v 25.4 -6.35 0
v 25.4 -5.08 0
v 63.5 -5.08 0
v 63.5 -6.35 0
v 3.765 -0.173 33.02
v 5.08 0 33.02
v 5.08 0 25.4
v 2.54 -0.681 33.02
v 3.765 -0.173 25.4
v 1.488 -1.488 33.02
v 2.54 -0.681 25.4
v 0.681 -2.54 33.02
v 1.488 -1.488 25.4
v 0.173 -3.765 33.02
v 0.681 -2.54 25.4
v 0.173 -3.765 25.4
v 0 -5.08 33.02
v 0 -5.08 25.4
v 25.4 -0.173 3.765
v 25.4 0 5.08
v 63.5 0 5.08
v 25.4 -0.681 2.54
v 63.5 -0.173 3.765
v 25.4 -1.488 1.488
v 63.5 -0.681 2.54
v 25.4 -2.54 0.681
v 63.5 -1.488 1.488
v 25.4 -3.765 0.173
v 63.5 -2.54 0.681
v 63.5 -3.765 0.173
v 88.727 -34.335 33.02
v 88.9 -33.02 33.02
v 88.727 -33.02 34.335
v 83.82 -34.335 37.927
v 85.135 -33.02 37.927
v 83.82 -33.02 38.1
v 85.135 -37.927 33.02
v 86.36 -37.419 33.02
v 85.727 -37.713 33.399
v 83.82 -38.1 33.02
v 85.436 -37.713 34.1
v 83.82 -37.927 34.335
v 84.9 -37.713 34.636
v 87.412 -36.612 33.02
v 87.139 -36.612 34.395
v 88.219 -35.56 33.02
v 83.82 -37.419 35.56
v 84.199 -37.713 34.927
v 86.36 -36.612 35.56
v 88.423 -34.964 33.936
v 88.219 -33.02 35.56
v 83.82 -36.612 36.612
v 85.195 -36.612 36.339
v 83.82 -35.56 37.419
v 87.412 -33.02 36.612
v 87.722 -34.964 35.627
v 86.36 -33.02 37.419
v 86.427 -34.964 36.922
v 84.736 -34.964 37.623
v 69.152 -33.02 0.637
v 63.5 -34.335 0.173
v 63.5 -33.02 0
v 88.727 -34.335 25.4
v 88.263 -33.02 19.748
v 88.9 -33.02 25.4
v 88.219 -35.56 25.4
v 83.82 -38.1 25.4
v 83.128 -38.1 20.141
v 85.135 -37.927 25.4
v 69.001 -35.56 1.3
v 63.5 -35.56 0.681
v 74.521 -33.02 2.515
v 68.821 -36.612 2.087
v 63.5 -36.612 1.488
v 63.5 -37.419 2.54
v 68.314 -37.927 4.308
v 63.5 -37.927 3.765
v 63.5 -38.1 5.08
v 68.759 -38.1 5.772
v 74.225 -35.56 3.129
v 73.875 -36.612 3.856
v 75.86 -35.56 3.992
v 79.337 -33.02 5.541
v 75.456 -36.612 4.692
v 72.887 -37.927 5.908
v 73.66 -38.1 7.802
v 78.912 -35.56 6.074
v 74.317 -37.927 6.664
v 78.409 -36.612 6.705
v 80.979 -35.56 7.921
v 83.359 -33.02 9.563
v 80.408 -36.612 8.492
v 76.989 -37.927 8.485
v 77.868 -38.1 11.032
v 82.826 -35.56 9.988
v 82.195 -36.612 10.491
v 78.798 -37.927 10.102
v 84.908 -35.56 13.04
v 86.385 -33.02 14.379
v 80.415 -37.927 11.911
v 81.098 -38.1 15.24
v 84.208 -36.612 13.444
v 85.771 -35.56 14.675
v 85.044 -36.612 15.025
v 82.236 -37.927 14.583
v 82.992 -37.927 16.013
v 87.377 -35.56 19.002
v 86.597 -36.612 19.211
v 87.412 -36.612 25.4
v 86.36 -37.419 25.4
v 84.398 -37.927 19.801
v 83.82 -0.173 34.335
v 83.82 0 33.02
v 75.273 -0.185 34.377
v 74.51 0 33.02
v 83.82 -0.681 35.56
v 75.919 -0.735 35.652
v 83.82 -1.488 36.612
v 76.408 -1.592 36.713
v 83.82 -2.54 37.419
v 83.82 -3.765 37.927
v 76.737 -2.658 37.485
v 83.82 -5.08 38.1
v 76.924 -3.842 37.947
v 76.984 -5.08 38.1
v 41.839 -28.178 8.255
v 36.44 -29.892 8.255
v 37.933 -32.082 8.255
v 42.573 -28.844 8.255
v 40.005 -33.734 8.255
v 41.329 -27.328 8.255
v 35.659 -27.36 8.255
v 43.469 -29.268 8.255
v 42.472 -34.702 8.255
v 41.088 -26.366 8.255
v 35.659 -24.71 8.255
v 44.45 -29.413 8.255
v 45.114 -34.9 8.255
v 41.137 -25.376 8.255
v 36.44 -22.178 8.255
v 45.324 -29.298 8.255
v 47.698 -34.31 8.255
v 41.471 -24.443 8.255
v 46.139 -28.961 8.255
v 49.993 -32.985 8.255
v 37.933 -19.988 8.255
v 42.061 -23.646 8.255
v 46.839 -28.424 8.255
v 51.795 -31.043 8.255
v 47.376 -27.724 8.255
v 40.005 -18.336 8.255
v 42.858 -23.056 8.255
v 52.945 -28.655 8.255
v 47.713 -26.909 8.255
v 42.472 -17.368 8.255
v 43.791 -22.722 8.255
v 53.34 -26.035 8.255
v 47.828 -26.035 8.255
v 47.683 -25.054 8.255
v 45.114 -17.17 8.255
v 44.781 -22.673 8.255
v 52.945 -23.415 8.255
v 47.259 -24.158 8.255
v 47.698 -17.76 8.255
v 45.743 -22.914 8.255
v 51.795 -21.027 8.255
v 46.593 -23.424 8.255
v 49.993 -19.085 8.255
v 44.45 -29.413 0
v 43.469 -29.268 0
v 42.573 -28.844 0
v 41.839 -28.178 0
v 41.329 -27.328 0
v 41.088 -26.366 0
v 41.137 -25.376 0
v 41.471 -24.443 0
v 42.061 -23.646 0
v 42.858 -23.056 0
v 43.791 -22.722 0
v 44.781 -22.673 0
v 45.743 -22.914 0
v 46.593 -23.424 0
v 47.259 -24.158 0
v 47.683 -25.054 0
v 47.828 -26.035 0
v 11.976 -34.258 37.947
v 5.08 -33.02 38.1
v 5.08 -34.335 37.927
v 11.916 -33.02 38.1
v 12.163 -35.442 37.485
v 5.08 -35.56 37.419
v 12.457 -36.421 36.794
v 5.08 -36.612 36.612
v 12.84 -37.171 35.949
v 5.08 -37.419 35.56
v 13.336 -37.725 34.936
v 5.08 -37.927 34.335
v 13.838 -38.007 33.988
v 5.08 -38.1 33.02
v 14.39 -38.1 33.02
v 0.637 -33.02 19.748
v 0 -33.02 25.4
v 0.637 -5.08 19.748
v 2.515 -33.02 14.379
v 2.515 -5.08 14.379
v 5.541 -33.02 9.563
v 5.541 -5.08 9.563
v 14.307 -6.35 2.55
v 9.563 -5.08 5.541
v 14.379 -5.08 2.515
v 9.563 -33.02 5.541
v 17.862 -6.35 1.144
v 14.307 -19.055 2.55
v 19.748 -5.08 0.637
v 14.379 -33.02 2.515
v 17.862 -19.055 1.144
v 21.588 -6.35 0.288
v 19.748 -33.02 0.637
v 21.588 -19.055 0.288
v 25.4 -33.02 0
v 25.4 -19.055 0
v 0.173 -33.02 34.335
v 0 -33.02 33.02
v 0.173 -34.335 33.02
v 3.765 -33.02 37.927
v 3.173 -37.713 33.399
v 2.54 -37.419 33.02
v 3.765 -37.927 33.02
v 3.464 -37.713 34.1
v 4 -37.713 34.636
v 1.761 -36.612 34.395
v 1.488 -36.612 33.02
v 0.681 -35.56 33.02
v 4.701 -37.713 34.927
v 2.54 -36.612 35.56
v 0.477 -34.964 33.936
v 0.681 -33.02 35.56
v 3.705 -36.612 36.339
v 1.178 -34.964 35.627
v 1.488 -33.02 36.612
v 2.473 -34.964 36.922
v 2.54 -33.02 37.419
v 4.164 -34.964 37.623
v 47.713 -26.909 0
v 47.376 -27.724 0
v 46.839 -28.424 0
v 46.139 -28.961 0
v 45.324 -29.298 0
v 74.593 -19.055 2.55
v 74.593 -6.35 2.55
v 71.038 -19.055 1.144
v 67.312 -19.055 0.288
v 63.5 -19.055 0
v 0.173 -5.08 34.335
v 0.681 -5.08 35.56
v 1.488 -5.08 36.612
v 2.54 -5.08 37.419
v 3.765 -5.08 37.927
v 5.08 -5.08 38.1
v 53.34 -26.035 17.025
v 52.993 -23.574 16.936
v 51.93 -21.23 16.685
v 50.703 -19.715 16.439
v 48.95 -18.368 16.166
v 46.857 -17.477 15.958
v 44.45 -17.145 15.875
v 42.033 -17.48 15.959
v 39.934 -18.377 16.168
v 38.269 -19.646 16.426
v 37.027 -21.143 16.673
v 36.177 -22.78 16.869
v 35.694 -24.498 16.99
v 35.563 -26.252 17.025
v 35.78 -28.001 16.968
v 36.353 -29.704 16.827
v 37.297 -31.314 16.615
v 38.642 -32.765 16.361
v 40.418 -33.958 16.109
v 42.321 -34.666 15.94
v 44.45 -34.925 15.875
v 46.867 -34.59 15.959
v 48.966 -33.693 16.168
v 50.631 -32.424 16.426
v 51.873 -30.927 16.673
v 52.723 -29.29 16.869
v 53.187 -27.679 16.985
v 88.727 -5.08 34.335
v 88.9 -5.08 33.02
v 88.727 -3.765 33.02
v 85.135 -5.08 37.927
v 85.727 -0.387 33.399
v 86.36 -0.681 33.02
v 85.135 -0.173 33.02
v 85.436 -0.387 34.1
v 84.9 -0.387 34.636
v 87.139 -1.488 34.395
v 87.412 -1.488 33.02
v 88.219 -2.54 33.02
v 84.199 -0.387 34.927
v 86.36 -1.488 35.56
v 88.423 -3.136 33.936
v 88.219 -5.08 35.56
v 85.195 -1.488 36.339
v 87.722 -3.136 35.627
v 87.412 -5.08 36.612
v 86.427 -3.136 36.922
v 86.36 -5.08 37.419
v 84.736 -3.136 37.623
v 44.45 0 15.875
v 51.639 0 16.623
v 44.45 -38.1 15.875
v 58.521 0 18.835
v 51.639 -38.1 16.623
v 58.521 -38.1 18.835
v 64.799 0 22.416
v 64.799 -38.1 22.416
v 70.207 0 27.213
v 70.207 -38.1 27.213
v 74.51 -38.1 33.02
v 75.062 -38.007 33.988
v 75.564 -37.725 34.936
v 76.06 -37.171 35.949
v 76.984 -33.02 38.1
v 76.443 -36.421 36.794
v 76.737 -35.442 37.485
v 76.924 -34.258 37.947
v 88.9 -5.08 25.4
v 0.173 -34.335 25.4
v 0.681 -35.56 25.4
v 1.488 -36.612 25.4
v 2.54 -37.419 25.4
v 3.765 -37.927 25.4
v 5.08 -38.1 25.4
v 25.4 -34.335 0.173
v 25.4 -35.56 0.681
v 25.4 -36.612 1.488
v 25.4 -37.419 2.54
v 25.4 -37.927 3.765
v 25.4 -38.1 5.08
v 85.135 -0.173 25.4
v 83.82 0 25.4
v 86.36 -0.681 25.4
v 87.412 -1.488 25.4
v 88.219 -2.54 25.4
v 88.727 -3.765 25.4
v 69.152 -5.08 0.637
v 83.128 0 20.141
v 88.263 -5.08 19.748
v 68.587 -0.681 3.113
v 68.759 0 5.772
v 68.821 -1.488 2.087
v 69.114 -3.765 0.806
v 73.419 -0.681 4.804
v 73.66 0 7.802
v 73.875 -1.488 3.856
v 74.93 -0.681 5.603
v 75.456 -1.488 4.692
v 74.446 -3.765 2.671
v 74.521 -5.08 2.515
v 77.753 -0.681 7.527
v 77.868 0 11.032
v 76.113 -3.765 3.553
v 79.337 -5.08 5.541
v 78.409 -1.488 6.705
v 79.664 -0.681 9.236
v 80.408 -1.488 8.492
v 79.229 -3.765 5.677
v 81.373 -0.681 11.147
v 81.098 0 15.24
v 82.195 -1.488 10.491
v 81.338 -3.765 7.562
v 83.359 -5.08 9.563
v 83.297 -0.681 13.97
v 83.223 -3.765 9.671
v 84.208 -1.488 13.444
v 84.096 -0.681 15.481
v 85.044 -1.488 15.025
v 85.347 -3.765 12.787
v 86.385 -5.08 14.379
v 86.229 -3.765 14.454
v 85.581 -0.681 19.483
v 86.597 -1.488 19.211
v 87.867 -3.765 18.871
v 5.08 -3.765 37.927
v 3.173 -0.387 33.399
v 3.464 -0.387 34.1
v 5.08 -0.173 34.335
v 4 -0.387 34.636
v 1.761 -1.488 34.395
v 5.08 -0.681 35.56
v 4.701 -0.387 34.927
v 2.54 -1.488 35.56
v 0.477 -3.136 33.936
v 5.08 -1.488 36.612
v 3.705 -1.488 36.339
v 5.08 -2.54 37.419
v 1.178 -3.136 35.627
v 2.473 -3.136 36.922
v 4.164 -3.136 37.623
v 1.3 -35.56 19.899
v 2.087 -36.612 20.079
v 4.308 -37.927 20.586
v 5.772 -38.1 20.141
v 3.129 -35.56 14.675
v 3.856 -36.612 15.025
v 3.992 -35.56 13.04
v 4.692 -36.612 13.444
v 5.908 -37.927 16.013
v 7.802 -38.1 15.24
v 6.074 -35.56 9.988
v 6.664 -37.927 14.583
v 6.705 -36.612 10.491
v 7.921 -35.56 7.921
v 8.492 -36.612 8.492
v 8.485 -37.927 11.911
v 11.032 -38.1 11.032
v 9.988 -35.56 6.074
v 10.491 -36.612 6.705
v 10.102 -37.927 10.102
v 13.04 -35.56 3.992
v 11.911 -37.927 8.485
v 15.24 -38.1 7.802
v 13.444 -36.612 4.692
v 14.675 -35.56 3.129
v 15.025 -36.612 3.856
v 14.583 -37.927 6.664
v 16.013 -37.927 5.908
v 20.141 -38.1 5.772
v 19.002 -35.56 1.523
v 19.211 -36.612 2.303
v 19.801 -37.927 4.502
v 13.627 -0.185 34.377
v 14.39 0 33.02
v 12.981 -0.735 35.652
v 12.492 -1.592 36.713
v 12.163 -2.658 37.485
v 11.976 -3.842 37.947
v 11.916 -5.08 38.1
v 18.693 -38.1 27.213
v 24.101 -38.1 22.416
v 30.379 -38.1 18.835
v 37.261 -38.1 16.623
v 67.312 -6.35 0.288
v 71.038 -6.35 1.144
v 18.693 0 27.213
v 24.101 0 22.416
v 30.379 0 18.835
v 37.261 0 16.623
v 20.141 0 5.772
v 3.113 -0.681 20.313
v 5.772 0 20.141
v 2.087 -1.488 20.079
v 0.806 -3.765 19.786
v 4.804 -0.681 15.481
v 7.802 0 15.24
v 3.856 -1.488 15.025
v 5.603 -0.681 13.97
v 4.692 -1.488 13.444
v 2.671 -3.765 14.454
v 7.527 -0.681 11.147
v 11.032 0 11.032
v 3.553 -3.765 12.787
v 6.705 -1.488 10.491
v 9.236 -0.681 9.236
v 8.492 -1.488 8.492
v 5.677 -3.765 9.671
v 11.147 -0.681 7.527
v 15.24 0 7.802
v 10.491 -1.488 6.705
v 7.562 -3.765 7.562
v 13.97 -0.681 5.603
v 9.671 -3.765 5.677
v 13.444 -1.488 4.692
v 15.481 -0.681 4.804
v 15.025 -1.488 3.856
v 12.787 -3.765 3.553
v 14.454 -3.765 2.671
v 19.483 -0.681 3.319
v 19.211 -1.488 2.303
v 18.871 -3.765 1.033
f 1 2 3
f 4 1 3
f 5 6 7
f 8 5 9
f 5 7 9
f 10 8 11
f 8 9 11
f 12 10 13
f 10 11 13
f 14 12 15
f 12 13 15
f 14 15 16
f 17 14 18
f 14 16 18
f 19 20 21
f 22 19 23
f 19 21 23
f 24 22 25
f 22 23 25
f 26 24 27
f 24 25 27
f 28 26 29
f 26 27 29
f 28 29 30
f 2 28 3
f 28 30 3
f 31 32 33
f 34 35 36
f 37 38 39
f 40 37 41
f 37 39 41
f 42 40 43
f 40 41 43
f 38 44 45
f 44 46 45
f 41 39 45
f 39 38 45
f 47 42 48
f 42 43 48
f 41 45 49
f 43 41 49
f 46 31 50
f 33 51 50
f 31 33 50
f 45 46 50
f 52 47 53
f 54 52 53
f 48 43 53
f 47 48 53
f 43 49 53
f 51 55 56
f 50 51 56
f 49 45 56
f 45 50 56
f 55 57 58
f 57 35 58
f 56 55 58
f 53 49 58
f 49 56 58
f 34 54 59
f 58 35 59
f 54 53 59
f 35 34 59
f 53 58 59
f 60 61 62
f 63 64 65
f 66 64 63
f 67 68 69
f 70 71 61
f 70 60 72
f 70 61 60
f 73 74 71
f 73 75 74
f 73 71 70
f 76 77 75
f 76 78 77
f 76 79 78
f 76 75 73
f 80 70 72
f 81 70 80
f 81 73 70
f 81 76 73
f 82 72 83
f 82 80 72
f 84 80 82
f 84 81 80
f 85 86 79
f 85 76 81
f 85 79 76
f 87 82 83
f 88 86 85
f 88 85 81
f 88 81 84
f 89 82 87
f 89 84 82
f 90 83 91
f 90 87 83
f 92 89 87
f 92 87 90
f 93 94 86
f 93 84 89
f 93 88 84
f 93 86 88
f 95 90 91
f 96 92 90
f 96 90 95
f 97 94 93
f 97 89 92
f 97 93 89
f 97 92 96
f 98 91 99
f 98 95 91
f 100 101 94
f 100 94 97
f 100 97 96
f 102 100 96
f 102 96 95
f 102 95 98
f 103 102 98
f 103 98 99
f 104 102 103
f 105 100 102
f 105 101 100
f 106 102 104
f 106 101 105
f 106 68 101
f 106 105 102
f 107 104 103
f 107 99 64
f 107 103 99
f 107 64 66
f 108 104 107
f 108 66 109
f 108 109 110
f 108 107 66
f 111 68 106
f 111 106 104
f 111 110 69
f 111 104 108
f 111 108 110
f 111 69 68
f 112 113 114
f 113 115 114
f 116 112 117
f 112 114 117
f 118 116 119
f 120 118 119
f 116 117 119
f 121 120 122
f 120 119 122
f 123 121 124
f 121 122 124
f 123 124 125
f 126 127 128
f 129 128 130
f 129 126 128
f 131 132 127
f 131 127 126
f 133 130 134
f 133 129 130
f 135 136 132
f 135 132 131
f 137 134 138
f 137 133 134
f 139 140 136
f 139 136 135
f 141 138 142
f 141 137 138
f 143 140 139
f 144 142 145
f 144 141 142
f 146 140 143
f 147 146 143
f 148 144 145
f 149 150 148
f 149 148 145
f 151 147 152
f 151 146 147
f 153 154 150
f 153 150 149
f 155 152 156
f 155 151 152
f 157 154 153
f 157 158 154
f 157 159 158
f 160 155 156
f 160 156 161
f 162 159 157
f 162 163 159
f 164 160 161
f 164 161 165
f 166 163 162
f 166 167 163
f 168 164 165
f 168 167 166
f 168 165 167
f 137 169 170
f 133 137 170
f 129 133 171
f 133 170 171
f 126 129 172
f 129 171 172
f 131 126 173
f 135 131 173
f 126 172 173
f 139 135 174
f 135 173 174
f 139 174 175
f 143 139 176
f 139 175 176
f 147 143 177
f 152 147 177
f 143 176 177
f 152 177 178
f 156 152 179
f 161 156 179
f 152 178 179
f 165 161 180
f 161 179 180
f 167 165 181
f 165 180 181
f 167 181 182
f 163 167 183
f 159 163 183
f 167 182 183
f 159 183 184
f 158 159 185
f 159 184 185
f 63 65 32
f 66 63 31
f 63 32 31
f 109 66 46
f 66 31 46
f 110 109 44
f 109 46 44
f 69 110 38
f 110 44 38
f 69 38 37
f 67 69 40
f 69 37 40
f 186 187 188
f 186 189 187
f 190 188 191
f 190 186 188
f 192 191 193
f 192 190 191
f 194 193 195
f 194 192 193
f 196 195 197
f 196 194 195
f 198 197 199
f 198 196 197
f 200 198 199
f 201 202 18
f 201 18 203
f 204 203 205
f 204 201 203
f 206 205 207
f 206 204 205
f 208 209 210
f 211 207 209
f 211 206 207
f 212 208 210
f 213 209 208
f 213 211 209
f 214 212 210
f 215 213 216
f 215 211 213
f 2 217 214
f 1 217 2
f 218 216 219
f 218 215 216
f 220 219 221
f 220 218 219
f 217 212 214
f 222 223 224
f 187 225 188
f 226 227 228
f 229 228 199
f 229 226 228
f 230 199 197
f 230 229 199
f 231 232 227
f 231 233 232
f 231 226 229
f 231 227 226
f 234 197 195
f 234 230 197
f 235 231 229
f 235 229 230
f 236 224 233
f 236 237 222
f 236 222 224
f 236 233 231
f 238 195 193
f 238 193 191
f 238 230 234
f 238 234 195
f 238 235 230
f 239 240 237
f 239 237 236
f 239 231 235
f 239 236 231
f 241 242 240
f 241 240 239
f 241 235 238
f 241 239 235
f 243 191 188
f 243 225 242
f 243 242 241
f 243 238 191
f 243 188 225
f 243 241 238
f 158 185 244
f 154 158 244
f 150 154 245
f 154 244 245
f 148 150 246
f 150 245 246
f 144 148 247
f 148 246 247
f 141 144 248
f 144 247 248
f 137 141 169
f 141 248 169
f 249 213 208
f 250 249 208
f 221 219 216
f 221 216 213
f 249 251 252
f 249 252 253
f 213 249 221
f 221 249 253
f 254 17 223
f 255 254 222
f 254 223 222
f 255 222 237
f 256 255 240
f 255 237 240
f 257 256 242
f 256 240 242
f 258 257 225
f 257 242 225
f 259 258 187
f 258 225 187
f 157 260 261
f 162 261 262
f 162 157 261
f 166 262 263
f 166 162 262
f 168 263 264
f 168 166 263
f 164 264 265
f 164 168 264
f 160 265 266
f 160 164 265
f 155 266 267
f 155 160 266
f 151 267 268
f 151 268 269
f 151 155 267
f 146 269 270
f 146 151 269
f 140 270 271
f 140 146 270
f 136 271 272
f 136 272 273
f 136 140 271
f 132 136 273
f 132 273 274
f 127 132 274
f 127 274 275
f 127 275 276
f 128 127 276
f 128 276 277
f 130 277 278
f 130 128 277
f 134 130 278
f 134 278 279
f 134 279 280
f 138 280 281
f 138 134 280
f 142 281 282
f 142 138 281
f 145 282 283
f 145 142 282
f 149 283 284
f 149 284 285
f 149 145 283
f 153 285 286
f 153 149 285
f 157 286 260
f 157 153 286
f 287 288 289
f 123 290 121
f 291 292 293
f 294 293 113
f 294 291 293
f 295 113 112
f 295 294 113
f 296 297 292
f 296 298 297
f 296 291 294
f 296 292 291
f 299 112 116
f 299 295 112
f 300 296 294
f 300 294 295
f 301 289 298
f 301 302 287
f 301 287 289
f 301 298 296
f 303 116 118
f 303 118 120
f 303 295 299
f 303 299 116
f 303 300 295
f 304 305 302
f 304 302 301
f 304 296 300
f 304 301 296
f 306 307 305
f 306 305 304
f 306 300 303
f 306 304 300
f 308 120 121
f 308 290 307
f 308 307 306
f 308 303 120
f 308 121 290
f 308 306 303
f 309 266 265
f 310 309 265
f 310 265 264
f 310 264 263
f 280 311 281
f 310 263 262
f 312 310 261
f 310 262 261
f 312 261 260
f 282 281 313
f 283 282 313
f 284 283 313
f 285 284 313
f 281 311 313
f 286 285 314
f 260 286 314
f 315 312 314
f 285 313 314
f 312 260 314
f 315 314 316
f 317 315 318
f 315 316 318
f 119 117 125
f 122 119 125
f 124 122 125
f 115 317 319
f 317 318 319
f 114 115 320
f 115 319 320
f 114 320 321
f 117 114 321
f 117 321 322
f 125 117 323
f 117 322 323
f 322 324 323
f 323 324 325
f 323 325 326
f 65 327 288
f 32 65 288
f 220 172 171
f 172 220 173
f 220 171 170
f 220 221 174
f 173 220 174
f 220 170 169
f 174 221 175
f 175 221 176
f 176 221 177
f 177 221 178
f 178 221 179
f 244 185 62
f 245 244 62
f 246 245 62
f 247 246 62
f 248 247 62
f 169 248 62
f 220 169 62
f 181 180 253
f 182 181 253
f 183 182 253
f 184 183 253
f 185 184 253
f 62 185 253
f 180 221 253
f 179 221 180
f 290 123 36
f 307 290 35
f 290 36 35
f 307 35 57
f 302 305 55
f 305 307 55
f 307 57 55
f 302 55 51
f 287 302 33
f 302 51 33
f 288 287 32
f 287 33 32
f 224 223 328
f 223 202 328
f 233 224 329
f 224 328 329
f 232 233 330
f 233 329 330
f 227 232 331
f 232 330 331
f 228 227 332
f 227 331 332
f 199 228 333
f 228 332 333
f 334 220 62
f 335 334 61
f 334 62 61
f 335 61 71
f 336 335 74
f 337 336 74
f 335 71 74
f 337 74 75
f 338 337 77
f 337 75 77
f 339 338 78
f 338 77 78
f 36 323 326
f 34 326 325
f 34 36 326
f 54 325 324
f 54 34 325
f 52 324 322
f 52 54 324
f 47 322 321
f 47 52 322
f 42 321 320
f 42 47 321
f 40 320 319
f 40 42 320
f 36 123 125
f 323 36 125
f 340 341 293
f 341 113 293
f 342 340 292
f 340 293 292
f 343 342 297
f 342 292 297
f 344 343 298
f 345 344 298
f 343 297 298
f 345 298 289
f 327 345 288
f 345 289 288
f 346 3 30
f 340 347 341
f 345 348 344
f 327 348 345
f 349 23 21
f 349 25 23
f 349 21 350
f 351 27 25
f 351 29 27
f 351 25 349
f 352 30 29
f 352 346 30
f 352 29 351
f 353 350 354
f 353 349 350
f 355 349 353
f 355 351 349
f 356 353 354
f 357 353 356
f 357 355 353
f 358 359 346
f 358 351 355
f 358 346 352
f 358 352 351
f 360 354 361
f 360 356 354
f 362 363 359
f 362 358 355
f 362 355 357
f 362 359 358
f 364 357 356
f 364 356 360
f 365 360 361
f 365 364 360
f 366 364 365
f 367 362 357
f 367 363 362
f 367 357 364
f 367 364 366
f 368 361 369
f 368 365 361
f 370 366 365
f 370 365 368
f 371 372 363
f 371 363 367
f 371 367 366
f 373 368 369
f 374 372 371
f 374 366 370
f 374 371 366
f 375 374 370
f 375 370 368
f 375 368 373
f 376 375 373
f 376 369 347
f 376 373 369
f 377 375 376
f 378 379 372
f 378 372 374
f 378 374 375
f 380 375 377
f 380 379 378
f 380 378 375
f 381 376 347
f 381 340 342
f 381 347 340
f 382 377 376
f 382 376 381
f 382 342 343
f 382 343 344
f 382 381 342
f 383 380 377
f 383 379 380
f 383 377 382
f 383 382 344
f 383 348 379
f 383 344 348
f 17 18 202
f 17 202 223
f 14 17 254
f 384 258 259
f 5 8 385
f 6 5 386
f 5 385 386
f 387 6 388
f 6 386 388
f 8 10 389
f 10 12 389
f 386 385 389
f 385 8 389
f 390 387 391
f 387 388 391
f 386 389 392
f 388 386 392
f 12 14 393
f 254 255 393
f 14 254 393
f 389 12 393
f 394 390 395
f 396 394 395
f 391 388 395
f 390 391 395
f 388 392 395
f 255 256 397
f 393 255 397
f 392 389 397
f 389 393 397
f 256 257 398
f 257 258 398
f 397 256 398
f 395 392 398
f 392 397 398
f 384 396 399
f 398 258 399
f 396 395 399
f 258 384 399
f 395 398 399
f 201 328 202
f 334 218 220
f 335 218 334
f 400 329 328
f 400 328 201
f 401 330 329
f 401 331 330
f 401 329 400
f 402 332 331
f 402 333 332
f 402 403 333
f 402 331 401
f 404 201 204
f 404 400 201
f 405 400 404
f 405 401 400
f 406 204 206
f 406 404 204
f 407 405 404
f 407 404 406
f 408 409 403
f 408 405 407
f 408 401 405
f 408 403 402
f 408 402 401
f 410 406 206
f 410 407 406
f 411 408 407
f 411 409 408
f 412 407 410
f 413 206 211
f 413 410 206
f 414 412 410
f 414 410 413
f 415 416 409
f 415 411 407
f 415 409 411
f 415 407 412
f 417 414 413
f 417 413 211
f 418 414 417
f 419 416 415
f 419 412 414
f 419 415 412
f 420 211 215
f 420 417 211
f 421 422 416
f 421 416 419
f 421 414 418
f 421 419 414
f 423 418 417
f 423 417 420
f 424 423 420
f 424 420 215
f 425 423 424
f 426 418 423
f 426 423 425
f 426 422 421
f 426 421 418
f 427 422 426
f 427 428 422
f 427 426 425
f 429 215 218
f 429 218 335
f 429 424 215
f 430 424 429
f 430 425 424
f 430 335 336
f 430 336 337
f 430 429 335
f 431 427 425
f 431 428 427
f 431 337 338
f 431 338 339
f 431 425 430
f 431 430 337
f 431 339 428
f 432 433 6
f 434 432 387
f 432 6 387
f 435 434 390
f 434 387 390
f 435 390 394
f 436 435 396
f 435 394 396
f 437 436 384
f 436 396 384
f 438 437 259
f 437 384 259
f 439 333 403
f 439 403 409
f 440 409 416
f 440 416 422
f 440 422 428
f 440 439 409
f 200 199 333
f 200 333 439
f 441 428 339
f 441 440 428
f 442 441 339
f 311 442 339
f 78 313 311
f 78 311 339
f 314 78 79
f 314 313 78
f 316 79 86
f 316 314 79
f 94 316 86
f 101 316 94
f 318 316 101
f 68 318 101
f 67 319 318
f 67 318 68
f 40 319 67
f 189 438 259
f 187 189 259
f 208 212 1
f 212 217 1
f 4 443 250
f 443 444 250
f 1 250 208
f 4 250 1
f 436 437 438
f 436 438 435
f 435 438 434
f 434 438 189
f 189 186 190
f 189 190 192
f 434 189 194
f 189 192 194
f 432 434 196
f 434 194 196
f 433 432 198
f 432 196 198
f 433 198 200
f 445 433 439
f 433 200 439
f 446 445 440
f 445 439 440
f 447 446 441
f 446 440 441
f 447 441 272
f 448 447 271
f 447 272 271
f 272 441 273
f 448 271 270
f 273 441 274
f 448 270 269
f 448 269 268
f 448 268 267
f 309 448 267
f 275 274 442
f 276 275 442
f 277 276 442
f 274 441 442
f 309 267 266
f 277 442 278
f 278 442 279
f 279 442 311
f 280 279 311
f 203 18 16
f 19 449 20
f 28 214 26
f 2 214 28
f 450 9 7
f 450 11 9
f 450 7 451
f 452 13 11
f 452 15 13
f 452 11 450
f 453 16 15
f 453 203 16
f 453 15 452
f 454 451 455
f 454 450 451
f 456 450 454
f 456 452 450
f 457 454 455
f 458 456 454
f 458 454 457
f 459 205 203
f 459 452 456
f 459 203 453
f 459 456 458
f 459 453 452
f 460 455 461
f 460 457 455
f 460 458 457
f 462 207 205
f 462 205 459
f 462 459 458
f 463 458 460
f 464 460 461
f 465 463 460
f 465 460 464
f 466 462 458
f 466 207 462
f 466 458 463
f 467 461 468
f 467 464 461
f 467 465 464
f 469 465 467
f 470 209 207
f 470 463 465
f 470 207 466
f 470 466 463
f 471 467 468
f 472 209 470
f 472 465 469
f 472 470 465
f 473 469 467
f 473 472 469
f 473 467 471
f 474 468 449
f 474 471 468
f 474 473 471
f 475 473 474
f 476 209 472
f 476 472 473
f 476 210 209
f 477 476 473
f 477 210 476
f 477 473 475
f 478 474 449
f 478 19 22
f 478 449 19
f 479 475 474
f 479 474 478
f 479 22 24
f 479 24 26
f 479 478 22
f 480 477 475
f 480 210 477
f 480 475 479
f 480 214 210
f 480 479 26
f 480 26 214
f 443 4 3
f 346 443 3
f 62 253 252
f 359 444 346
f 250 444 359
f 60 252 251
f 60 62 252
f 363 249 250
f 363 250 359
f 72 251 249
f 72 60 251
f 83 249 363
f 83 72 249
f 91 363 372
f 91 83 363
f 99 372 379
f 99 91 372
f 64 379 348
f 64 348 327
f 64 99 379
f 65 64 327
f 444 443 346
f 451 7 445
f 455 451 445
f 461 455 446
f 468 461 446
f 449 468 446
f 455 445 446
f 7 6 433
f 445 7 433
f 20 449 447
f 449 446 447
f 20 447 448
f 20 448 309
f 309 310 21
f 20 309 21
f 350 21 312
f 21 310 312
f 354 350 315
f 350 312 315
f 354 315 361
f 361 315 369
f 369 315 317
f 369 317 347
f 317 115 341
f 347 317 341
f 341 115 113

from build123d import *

# Parameters (mm, degrees)
F0_W      = 88.9
F0_H      = 50.8
F1_DEPTH  = 38.1
F3_DEPTH  = 38.101
F5_DEPTH  = 25.4
F7_R      = 8.89
F8_DEPTH  = 25.4
F9_W      = 12.7052063286
F9_H      = 2.550378209
F10_DEPTH = 207.518
F11_F1_R  = 25.4
F11_F2_R  = 25.4
F12_W     = 88.9
F12_H     = 12.7
F13_DEPTH = 56.642
F14_R     = 5.08
F15_DEPTH = 1.27


with BuildPart() as f1:
    # F0 (on Front) → F1 (new body)
    with BuildSketch(Plane.XZ):
        with Locations((44.45, 25.4)):
            Rectangle(F0_W, F0_H)
    extrude(amount=F1_DEPTH)

    # F2 (on face) → F3 (cut, through all)
    with BuildSketch(Plane.XZ.offset(38.1)):
        with BuildLine():
            ThreePointArc((9.525, 50.8), (19.7542956671, 26.1042956671), (44.45, 15.875))
            Line((44.45, 15.875), (44.45, 50.8))
            Line((44.45, 50.8), (9.525, 50.8))
        make_face()
        with BuildLine():
            Line((44.45, 50.8), (44.45, 15.875))
            ThreePointArc((44.45, 15.875), (69.1457043329, 26.1042956671), (79.375, 50.8))
            Line((79.375, 50.8), (44.45, 50.8))
        make_face()
    extrude(amount=-F3_DEPTH, mode=Mode.SUBTRACT)

    # F4 (on face) → F5 (cut)
    with BuildSketch(Plane(origin=(0, 0, 0), x_dir=(1, 0, 0), z_dir=(0, 0, -1))):
        with BuildLine():
            ThreePointArc((47.8282, 26.035), (46.8387481282, 28.4237481282), (44.45, 29.4132))
            ThreePointArc((44.45, 29.4132), (42.0612518718, 23.6462518718), (47.8282, 26.035))
        make_face()
    extrude(amount=-F5_DEPTH, mode=Mode.SUBTRACT)

    # F7 (on offset) → F8 (cut)
    with BuildSketch(Plane.XY.offset(9.525)):
        with Locations((44.45, -26.035)):
            Circle(F7_R)
    extrude(amount=F8_DEPTH, mode=Mode.SUBTRACT)

    # F9 (on face) → F10 (cut)
    with BuildSketch(Plane.YZ.offset(88.9)):
        with Locations((-12.7026031643, 1.2751891045)):
            Rectangle(F9_W, F9_H)
    extrude(amount=-F10_DEPTH, mode=Mode.SUBTRACT)

    # F11: fillet of radius 25.4 on 4 edges, made by hand

    # F11_f1
    f11_f1_edges = [f1.edges().sort_by_distance(p)[0] for p in [
        (0, -3.175, 0),
    ]]
    fillet(f11_f1_edges, radius=F11_F1_R)

    # F11_f2
    f11_f2_edges = [f1.edges().sort_by_distance(p)[0] for p in [
        (88.9, -3.175, 0),
    ]]
    fillet(f11_f2_edges, radius=F11_F2_R)

    # F12 (on face) → F13 (cut)
    with BuildSketch(Plane(origin=(0, 0, 0), x_dir=(-1, 0, 0), z_dir=(0, 1, 0))):
        with Locations((-44.45, 44.45)):
            Rectangle(F12_W, F12_H)
    extrude(amount=-F13_DEPTH, mode=Mode.SUBTRACT)

    # F14
    f14_edges = [f1.edges().sort_by_distance(p)[0] for p in [
        (0, -19.05, 38.1),
        (88.9, -19.05, 38.1),
        (7.439488, -38.1, 7.439488),
        (7.439488, 0, 7.439488),
        (5.957966, -38.1, 38.1),
        (82.942034, -38.1, 38.1),
        (5.957966, 0, 38.1),
        (82.942034, 0, 38.1),
    ]]
    fillet(f14_edges, radius=F14_R)

    # F15 (cut): a face of the model
    f15_faces = [f1.faces().sort_by_distance(p)[0] for p in [
        (35.8114471714, -26.035, 9.525),
    ]]
    extrude(f15_faces, amount=-F15_DEPTH, mode=Mode.SUBTRACT)


solid = f1.part
